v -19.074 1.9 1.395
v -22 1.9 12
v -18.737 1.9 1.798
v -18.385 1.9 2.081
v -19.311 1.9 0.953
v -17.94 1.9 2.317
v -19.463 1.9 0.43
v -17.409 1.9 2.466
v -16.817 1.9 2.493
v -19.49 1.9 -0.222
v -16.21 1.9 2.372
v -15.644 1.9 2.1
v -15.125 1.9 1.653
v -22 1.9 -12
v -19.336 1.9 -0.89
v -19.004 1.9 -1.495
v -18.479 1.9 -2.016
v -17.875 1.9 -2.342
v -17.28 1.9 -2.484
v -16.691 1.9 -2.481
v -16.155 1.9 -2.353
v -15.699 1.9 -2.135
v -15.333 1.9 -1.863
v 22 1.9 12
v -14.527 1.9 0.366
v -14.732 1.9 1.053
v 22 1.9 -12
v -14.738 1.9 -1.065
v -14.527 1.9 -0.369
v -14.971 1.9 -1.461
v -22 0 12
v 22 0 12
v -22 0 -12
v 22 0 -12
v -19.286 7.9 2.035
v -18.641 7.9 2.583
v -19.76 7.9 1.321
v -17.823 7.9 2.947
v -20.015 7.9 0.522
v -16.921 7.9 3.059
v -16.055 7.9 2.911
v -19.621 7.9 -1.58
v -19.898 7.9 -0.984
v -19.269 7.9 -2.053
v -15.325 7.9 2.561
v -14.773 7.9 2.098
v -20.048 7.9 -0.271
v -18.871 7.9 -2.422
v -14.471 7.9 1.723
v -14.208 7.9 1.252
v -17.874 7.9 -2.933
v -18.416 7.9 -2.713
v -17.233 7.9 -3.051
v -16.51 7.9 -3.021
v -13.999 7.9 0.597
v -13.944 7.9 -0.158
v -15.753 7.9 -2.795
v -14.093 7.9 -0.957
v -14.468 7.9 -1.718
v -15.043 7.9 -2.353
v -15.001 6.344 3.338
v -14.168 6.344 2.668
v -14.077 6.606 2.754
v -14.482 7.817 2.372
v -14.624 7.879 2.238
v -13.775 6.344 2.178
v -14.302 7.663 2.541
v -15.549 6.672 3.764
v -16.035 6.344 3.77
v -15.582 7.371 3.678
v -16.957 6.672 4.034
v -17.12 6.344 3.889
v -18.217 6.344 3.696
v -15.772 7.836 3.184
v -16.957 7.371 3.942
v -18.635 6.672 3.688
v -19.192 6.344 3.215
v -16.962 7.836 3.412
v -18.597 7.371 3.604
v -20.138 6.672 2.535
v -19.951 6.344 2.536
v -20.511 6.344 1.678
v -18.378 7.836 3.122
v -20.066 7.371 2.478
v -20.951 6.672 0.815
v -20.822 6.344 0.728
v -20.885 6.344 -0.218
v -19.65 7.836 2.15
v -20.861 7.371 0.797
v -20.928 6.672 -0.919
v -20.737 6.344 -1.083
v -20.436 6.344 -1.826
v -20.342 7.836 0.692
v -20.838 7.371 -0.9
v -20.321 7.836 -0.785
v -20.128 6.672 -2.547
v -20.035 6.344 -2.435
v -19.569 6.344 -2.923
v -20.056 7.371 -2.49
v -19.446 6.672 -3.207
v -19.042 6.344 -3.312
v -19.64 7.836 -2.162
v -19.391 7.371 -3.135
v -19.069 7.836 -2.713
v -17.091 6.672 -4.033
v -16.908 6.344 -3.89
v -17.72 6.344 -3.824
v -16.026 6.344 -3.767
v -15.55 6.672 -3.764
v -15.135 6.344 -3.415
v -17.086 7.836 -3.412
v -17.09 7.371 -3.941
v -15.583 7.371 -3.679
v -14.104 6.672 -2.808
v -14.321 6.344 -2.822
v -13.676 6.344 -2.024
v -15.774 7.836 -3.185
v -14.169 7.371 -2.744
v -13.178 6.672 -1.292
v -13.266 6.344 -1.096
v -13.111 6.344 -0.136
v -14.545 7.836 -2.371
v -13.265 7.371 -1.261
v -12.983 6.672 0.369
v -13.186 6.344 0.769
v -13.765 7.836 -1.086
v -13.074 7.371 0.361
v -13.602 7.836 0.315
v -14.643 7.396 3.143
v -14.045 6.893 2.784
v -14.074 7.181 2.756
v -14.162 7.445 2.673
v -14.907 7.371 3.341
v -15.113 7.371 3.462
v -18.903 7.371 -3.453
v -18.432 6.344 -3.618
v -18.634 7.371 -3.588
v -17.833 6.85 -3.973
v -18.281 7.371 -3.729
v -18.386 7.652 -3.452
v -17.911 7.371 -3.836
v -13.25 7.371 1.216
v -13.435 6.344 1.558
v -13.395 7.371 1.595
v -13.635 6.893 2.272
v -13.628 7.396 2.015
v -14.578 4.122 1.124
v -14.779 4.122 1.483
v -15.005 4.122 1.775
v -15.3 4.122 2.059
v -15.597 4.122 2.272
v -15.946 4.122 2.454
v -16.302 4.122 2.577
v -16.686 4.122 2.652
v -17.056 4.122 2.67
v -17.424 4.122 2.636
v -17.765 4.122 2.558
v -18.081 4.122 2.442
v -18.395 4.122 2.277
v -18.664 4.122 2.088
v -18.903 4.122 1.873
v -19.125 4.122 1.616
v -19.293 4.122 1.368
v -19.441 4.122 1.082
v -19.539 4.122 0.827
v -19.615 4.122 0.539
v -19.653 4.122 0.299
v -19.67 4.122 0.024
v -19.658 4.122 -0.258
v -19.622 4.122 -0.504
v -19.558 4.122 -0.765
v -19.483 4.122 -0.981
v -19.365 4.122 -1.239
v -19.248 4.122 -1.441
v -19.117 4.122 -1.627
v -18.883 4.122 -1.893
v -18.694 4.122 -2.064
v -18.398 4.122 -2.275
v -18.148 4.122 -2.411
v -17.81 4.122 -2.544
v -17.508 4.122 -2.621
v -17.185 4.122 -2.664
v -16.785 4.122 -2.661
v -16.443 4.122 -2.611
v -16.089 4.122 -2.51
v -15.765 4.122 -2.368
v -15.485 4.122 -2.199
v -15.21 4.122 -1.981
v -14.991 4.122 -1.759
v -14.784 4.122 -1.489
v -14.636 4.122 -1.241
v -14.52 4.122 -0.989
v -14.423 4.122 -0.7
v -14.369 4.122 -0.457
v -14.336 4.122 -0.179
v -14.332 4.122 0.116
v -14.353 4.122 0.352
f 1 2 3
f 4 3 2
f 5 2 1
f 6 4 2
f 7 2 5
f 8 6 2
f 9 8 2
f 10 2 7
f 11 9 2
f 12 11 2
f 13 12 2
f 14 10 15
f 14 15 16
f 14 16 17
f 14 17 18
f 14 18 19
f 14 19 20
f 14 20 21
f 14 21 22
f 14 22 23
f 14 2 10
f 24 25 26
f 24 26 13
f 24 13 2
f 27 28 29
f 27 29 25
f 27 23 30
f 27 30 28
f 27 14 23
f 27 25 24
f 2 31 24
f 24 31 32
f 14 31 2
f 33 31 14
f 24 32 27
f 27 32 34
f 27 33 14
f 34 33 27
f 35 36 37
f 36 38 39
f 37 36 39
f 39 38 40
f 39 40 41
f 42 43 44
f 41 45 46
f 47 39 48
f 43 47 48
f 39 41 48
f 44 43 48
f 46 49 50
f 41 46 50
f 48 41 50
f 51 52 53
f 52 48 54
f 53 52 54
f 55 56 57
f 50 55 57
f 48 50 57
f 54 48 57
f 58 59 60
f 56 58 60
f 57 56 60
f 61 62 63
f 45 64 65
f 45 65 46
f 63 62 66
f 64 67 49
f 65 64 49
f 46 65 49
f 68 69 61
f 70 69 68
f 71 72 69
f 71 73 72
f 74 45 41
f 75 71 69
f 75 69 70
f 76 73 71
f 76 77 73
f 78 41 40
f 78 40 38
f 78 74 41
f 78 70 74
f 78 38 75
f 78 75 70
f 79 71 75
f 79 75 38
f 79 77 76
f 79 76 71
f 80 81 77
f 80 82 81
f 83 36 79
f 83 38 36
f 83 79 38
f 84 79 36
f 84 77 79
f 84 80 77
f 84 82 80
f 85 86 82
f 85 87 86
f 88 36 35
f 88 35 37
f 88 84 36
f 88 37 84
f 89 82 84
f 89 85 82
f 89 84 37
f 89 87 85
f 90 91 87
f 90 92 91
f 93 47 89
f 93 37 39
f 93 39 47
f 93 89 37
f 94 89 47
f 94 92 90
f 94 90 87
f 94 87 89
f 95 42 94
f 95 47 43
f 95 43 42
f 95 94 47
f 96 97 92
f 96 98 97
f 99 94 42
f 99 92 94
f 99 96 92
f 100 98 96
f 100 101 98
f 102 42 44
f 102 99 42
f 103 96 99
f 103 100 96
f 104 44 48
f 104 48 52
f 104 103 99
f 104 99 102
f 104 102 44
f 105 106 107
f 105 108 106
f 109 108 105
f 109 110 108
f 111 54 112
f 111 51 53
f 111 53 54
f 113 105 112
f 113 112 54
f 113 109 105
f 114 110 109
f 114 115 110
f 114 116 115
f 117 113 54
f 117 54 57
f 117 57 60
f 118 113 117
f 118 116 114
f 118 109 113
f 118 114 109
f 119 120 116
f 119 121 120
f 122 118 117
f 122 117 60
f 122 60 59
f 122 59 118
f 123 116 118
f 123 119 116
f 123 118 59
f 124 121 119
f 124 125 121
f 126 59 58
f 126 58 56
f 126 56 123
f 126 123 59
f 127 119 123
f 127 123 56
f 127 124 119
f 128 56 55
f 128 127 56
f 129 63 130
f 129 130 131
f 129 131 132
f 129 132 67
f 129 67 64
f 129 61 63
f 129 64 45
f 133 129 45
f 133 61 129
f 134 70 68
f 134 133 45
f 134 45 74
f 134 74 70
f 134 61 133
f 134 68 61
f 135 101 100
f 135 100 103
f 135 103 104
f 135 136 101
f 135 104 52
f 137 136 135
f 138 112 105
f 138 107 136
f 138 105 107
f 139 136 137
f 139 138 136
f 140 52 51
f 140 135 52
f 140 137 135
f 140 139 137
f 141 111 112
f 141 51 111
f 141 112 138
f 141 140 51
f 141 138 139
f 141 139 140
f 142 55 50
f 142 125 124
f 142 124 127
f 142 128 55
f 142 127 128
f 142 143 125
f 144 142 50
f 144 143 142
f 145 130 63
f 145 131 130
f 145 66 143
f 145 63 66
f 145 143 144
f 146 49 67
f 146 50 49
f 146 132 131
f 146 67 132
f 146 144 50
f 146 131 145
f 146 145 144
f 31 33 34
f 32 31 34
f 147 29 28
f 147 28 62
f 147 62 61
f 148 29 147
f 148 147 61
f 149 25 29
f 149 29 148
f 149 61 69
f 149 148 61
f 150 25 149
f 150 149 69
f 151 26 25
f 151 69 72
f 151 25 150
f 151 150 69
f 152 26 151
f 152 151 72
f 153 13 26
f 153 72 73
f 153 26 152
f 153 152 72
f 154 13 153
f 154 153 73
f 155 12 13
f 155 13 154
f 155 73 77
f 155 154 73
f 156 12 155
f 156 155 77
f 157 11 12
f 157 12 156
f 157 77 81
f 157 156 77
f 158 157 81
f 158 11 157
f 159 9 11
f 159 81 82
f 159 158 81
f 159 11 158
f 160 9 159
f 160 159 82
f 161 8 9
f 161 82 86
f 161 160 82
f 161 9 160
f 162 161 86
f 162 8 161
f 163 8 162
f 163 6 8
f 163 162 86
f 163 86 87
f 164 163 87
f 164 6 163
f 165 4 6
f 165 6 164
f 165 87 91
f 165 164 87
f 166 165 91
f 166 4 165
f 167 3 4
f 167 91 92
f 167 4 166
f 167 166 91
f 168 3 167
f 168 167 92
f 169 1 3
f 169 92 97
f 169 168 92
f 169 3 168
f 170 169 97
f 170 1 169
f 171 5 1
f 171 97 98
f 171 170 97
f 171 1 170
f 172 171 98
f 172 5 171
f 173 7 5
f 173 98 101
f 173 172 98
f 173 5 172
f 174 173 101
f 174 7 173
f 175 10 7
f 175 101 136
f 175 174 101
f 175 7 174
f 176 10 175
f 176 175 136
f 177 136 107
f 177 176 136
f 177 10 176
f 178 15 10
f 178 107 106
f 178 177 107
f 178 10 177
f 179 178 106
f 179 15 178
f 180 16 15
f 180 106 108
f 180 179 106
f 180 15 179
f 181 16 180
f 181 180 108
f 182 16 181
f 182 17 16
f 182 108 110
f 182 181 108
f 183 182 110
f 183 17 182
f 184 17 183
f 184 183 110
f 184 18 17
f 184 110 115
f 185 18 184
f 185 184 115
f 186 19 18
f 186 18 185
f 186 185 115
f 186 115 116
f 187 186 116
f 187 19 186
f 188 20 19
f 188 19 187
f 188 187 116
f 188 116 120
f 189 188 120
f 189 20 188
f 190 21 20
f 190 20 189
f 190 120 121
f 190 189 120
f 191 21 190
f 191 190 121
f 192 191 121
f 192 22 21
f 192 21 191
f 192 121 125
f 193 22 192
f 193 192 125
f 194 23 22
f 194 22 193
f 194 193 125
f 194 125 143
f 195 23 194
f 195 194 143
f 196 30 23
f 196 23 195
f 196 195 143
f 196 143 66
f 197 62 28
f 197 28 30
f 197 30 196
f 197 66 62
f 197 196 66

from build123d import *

# Parameters (mm, degrees)
SKETCH1_W           = 44
SKETCH1_H           = 24
BOSS_EXTRUDE1_DEPTH = 1.9
FILLET1_R           = 1


with BuildPart() as part:
    # Sketch1 → Boss-Extrude1 (new body)
    with BuildSketch(Plane(origin=(0, 0, 0), x_dir=(1, 0, 0), z_dir=(0, 1, 0))):
        Rectangle(SKETCH1_W, SKETCH1_H)
    extrude(amount=BOSS_EXTRUDE1_DEPTH)

    # Loft2: read off the stored shape, not the designer's step
    # Loft2: loft between two sections, ruled curve by curve
    loft2_from = [
        Edge.make_bspline([(-13.96783709, 7.9, 3.975674545), (-21.919186181, 7.9, 10.040000365), (-27.983512, 7.9, 2.088651274), (-20.03216291, 7.9, -3.975674545), (-12.080813819, 7.9, -10.040000365), (-6.016488, 7.9, -2.088651274), (-13.96783709, 7.9, 3.975674545)], [0, 0, 0, 0, 0.5, 0.5, 0.5, 1, 1, 1, 1], 3, [1, 0.333333333, 0.333333333, 1, 0.333333333, 0.333333333, 1]),
    ]
    loft2_to = [
        Edge.make_bspline([(-14.73827925, 1.9, -1.065185077), (-12.607909097, 1.9, 3.458256424), (-17.131350597, 1.9, 5.588626577), (-19.26172075, 1.9, 1.065185077), (-21.392090903, 1.9, -3.458256424), (-16.868649403, 1.9, -5.588626577), (-14.73827925, 1.9, -1.065185077)], [0, 0, 0, 0, 0.5, 0.5, 0.5, 1, 1, 1, 1], 3, [1, 0.333333333, 0.333333333, 1, 0.333333333, 0.333333333, 1]),
    ]
    loft2 = Solid(Shell([*[Face.make_surface_from_curves(loft2_from[k], loft2_to[k]) for k in range(1)], Face(Wire(loft2_from)), Face(Wire(loft2_to))]))
    add(loft2)

    # Fillet1
    fillet1_edges = [part.edges().sort_by_distance(p)[0] for p in [
        (-20.03216291, 7.9, -3.975674545),
    ]]
    fillet(fillet1_edges, radius=FILLET1_R)


solid = part.part
